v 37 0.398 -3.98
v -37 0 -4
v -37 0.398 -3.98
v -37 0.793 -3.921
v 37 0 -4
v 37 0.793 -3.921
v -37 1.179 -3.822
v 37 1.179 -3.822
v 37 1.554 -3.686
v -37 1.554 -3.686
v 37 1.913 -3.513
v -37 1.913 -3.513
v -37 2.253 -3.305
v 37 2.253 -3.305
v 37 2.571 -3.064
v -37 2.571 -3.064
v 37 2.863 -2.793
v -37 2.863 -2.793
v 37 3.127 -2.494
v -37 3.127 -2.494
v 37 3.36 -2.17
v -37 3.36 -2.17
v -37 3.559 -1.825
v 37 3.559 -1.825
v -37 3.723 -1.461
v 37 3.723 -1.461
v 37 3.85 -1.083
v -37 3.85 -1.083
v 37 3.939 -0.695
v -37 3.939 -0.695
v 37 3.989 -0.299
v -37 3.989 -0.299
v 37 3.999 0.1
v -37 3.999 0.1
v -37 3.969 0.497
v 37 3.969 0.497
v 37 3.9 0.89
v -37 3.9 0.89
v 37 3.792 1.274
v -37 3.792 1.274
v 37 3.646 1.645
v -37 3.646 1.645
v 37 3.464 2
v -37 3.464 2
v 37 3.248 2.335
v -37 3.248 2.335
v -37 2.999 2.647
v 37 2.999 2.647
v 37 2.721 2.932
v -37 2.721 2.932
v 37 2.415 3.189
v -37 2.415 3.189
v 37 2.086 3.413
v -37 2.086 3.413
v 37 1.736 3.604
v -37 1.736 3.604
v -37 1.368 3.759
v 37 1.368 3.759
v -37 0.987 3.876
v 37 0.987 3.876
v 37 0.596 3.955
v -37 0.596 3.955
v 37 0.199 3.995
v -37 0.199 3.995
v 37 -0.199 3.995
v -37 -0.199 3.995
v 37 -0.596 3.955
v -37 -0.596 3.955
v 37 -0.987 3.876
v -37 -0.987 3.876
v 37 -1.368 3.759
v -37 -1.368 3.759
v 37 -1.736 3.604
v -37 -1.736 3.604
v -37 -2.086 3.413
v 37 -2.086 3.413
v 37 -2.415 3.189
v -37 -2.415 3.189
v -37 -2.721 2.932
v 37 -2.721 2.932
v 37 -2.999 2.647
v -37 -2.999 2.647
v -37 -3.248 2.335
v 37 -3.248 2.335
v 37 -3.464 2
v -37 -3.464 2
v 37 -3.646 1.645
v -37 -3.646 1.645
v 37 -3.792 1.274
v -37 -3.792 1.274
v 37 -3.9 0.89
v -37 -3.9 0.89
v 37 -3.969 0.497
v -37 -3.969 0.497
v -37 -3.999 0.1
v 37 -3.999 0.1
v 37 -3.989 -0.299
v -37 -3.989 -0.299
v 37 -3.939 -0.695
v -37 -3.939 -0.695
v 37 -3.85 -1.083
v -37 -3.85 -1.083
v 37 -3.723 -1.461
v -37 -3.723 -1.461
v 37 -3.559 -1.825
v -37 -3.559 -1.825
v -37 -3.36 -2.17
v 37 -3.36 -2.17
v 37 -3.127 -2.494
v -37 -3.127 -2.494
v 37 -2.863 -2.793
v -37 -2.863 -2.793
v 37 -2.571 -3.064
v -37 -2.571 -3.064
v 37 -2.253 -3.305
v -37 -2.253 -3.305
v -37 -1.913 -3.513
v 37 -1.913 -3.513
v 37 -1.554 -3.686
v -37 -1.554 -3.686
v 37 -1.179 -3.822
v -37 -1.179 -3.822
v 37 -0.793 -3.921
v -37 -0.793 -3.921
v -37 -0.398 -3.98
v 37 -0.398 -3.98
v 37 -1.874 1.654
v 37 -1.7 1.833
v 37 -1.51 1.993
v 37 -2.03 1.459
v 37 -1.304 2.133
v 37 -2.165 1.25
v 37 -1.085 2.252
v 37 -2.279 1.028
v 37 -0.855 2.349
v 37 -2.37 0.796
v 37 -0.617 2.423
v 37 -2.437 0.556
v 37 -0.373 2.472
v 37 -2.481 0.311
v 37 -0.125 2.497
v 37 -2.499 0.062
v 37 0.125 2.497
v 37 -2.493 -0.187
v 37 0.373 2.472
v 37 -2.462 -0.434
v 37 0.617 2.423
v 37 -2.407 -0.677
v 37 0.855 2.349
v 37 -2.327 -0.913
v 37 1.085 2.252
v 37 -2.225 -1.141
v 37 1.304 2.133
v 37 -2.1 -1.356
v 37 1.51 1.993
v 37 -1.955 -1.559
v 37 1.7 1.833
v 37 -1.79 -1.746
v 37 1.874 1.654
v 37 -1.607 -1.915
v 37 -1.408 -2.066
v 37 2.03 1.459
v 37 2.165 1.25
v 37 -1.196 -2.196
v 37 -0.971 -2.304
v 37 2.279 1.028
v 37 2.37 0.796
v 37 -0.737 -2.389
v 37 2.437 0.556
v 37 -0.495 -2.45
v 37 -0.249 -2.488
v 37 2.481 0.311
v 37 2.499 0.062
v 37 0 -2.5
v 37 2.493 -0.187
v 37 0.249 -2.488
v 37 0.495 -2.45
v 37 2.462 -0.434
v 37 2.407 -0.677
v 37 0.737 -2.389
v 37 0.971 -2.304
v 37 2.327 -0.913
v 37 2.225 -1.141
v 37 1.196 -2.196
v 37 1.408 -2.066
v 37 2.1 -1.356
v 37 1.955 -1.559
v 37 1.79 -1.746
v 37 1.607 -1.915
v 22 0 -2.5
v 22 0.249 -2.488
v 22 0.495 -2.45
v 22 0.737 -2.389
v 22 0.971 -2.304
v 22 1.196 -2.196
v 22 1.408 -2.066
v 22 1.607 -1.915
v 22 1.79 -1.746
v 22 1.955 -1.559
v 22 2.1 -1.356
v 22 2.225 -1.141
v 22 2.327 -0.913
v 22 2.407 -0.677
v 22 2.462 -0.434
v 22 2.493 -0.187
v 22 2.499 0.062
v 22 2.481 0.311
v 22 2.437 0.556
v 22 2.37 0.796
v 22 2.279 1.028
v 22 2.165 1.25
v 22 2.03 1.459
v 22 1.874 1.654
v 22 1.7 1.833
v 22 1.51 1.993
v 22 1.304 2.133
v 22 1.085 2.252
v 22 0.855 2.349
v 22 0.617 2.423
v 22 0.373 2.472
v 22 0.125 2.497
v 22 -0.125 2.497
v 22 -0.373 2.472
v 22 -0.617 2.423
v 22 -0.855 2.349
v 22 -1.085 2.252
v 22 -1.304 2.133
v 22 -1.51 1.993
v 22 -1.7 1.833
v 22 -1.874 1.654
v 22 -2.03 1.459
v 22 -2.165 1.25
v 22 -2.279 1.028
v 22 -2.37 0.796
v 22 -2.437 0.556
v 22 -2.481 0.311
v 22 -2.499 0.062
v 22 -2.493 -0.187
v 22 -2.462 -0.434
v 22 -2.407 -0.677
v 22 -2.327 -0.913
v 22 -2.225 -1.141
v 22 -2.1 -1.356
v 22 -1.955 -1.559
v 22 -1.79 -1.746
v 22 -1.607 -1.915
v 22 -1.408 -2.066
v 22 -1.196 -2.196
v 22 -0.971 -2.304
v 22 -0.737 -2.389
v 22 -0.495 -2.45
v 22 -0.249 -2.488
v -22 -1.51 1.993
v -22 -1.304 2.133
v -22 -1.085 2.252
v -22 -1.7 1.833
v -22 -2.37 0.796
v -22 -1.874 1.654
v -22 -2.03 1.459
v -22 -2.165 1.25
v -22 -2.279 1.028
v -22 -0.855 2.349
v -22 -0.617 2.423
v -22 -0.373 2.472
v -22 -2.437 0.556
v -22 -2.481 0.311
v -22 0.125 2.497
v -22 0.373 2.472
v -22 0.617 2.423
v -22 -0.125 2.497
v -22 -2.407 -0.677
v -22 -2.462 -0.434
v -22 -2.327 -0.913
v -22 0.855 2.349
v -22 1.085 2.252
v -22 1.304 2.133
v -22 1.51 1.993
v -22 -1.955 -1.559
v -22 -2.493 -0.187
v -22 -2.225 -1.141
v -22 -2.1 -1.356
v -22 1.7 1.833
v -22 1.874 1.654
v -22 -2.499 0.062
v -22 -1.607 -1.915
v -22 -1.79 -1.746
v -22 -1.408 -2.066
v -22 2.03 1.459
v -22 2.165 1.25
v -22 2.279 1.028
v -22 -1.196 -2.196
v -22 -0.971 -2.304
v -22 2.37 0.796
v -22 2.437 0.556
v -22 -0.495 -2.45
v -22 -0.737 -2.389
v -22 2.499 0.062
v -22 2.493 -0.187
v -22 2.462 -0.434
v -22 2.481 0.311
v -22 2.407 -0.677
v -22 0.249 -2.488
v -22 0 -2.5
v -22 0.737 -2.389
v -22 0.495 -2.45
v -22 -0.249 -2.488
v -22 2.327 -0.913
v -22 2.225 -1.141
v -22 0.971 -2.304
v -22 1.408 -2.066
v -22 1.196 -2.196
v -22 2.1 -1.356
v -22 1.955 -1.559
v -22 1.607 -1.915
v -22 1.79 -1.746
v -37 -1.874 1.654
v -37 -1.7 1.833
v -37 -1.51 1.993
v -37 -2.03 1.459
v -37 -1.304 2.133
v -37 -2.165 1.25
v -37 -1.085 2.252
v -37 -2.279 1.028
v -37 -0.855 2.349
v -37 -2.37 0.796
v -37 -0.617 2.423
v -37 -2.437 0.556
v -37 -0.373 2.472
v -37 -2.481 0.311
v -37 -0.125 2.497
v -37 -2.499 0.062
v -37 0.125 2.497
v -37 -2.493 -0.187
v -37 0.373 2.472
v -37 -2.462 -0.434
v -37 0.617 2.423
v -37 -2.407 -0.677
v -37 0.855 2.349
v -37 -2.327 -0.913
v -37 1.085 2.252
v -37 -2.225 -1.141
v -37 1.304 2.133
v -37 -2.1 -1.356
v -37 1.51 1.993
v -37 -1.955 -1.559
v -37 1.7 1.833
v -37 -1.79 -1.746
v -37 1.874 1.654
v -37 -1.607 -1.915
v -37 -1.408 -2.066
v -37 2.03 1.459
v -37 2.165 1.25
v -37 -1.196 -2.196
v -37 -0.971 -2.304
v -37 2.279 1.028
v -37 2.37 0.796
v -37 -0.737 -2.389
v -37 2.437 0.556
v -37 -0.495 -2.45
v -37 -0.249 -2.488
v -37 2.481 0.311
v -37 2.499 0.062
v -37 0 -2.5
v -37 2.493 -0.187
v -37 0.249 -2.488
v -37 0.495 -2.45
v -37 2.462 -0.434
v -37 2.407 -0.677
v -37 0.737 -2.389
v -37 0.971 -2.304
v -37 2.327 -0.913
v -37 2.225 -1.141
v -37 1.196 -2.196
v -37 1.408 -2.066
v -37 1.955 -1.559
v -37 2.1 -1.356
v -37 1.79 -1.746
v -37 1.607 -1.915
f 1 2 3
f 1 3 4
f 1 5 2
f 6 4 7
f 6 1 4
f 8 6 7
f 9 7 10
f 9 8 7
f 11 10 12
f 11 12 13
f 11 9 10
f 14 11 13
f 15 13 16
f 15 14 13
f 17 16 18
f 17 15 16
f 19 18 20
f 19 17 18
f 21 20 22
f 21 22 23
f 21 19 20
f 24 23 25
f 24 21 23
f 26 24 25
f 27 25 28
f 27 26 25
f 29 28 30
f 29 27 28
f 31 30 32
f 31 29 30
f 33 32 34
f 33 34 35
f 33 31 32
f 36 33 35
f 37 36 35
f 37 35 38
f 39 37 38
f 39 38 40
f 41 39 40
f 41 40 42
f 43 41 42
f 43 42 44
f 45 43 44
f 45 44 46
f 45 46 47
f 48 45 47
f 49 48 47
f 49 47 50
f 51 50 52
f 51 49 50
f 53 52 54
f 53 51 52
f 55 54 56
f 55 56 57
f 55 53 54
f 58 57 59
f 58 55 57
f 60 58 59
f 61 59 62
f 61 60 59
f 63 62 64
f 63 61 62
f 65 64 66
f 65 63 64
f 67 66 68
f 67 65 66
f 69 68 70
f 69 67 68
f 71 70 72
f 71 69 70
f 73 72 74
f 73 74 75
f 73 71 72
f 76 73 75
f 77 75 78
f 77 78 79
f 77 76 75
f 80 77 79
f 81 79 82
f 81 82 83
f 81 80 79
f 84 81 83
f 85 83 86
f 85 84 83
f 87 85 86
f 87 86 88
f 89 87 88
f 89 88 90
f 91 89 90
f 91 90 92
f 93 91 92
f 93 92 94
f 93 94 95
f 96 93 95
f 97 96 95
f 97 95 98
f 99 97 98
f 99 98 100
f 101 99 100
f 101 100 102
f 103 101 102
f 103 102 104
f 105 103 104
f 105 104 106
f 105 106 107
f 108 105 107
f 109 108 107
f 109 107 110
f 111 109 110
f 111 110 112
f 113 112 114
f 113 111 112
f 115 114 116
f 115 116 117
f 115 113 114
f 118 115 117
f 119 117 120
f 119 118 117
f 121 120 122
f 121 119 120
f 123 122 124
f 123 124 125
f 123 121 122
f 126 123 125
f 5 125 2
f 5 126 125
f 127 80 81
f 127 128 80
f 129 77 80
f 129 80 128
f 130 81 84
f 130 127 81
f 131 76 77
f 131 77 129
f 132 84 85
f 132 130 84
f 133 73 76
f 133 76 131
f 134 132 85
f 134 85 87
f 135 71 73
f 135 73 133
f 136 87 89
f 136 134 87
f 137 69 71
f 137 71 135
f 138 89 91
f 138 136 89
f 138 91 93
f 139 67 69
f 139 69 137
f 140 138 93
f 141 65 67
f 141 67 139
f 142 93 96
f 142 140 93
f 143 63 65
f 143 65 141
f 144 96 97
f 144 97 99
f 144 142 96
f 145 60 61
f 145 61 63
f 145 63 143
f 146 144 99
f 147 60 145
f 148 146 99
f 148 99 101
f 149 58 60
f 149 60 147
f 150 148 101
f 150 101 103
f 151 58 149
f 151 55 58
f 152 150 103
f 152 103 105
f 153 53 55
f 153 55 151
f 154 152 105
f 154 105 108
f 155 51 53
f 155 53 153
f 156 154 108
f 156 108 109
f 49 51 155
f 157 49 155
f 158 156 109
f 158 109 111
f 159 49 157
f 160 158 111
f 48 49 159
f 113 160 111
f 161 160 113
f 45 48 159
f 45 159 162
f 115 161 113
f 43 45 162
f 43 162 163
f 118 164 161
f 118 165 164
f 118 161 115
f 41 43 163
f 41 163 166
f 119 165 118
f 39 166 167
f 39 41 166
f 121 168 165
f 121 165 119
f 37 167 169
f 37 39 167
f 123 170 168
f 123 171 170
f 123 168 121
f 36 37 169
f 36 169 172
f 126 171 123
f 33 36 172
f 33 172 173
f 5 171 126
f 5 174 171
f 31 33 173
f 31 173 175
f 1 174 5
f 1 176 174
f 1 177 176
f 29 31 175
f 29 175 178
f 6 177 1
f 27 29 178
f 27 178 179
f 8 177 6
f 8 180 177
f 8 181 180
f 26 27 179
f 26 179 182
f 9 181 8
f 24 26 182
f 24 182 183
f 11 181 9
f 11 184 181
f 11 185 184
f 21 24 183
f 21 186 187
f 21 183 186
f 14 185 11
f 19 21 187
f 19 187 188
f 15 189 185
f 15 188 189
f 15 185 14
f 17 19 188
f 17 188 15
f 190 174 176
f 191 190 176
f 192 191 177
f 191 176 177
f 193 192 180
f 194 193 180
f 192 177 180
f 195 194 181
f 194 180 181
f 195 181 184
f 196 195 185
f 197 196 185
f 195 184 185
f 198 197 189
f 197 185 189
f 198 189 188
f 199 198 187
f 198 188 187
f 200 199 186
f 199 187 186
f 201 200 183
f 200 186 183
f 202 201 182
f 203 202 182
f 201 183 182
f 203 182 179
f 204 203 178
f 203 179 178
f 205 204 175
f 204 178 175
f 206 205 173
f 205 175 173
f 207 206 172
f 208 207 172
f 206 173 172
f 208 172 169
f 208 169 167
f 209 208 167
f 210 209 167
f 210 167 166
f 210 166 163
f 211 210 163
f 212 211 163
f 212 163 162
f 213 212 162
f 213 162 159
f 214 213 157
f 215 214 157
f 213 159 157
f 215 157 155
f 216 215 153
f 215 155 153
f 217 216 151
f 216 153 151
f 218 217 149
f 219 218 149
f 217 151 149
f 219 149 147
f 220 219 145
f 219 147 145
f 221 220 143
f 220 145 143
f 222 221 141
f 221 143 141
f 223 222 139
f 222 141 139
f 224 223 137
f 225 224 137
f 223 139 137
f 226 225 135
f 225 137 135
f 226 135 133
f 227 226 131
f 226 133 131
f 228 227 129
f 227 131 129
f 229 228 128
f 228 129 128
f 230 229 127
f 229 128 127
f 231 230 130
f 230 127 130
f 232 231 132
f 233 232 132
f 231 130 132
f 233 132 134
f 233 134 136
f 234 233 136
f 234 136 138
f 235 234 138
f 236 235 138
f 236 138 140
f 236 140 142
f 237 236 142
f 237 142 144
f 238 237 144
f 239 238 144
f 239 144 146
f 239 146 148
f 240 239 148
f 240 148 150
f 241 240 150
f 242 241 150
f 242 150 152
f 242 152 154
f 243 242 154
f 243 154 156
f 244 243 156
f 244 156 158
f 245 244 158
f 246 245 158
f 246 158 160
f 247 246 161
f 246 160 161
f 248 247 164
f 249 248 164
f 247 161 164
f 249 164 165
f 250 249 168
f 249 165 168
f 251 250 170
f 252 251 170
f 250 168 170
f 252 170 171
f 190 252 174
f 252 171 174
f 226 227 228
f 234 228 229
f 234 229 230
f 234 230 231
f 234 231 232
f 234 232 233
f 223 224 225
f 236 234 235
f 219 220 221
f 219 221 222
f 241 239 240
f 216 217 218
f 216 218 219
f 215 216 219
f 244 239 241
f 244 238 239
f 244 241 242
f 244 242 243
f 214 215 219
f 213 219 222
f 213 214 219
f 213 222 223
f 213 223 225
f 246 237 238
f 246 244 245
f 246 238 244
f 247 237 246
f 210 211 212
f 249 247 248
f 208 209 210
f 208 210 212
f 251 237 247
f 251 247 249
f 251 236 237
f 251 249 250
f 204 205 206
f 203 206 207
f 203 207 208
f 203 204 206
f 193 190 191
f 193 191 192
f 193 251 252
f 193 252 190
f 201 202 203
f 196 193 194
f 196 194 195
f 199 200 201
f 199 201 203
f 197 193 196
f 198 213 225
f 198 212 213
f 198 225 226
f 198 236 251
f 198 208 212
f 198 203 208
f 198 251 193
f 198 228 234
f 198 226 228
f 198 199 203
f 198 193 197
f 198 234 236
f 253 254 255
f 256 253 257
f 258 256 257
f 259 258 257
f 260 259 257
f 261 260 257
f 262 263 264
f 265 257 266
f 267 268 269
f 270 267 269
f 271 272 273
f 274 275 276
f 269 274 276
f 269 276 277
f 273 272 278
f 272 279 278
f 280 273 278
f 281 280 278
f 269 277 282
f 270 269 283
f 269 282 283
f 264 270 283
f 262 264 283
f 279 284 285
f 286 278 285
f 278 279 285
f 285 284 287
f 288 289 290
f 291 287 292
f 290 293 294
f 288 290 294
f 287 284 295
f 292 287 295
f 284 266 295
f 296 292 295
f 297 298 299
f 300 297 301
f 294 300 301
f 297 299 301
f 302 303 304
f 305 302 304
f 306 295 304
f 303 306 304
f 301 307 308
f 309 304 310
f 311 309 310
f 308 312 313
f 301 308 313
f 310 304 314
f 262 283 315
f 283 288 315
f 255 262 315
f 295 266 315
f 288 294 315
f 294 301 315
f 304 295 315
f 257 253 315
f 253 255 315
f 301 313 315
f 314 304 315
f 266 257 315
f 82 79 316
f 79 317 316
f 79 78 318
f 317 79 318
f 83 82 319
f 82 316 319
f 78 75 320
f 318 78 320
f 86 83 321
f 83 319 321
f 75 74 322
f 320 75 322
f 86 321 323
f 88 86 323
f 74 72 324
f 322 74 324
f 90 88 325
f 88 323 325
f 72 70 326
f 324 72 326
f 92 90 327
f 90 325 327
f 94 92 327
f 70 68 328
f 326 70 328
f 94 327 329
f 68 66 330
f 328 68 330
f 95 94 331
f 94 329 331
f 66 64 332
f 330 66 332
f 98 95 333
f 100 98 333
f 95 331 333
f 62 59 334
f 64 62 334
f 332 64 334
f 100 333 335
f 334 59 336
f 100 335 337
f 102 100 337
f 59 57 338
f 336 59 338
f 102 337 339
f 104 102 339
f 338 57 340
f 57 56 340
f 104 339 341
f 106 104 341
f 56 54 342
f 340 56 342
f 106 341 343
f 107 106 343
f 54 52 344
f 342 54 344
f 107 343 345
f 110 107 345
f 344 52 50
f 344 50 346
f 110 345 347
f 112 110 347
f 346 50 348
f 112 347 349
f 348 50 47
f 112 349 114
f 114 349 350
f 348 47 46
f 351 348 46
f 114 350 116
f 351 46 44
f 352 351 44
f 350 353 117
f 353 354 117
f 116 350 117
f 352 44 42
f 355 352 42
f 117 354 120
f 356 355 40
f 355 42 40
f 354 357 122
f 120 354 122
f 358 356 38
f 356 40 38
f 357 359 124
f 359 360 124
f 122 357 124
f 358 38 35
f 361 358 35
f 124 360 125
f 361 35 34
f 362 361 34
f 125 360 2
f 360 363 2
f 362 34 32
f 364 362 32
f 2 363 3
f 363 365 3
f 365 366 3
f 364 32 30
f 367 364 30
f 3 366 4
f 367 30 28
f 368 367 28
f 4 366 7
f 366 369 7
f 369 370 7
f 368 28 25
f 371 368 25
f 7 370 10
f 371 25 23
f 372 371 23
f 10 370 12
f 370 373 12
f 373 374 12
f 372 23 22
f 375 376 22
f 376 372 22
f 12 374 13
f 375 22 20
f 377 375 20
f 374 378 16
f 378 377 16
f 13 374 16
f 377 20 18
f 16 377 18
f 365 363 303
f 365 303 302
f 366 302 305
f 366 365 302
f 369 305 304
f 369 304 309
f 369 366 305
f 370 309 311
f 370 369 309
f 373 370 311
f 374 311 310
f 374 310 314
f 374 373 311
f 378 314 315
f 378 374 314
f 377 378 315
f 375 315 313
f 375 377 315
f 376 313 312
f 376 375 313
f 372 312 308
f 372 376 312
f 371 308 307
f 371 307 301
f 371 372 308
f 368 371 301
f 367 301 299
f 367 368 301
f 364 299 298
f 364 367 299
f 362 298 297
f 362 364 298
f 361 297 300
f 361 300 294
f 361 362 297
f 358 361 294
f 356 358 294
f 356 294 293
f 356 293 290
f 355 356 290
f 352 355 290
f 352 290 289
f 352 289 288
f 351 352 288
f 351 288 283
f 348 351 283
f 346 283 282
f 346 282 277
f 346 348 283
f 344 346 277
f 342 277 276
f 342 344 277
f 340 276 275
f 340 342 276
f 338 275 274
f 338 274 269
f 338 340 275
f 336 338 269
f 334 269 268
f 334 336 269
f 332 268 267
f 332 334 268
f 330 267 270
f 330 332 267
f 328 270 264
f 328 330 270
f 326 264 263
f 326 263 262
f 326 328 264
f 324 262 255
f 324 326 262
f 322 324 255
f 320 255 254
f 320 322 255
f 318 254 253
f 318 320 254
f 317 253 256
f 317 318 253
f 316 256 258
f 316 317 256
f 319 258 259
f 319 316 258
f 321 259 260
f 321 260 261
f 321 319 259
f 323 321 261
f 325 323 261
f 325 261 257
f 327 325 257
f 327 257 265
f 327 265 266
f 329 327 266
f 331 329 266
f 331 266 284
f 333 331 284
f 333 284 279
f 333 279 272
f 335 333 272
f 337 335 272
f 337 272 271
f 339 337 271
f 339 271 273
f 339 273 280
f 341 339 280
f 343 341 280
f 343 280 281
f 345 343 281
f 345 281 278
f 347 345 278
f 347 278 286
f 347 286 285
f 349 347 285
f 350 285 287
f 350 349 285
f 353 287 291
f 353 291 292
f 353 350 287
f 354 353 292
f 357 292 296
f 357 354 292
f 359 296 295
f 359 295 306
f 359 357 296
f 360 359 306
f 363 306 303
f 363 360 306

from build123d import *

# Parameters (mm, degrees)
SKETCH1_R           = 4
BOSS_EXTRUDE1_DEPTH = 37
SKETCH2_R           = 2.5
CUT_EXTRUDE1_DEPTH  = 15


with BuildPart() as part:
    # Sketch1 → Boss-Extrude1 (new, symmetric)
    with BuildSketch(Plane(origin=(0, 0, 0), x_dir=(0, 0, -1), z_dir=(1, 0, 0))):
        Circle(SKETCH1_R)
    extrude(amount=BOSS_EXTRUDE1_DEPTH, both=True)

    # Sketch2 → Cut-Extrude1 (cut)
    with BuildSketch(Plane(origin=(37, 0, 0), x_dir=(0, 0, -1), z_dir=(1, 0, 0))):
        Circle(SKETCH2_R)
    cut_extrude1 = extrude(amount=-CUT_EXTRUDE1_DEPTH, mode=Mode.SUBTRACT)

    # Mirror1: Cut-Extrude1 across plane
    add(cut_extrude1.mirror(Plane(origin=(0, 0, 0), x_dir=(0, 0, 1), z_dir=(1, 0, 0))), mode=Mode.SUBTRACT)


solid = part.part
